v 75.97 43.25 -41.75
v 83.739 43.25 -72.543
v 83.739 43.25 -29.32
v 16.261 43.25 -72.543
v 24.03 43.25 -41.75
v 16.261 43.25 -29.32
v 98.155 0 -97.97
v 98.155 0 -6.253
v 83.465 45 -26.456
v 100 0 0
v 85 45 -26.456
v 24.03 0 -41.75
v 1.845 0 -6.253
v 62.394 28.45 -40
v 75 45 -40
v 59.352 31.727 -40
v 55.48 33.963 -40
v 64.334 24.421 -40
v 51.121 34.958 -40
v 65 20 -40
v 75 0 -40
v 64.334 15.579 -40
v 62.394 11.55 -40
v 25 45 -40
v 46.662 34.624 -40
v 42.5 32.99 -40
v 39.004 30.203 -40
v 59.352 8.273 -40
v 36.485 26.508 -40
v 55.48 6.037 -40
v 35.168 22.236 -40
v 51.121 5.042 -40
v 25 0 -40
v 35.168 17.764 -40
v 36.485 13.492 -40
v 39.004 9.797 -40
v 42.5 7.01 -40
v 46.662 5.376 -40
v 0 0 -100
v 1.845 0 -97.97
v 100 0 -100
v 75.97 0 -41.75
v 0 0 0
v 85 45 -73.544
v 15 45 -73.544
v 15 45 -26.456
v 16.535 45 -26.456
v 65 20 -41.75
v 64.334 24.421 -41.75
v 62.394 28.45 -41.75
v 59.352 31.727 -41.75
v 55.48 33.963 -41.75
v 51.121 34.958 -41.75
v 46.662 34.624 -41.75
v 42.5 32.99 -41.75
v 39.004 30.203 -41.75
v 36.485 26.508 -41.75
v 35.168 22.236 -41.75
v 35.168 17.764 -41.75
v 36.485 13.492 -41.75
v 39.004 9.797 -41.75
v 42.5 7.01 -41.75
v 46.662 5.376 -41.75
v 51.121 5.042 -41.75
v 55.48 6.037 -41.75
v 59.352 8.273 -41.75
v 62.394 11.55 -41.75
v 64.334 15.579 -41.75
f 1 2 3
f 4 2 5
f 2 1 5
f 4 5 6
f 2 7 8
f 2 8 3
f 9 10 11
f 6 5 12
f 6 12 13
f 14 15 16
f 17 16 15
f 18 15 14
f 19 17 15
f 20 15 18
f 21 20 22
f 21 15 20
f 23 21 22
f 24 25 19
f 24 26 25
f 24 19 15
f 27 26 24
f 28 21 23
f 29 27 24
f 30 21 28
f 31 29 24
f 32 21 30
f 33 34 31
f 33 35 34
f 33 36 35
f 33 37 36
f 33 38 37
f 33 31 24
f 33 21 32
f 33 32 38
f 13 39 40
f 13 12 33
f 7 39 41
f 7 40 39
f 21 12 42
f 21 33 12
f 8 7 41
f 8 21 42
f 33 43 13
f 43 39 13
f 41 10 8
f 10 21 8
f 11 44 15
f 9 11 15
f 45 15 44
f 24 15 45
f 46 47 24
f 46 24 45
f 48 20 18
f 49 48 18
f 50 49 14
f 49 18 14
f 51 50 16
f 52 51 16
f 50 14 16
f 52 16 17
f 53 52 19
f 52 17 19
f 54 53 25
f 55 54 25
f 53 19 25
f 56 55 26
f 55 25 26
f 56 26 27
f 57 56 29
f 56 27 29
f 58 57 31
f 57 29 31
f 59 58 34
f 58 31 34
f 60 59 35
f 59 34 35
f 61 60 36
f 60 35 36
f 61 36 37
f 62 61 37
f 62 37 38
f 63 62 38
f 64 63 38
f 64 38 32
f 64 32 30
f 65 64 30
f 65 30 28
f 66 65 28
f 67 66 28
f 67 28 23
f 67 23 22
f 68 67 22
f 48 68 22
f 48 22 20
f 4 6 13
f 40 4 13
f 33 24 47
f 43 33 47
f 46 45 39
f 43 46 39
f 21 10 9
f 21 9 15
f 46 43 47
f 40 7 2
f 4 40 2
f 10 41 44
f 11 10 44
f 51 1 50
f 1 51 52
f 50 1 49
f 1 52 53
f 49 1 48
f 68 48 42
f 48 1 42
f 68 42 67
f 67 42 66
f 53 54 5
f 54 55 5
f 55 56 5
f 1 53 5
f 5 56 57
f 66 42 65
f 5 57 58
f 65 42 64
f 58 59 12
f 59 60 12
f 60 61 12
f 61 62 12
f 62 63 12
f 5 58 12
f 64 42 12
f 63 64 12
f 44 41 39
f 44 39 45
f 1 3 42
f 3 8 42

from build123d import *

# Parameters (mm, degrees)
GRUNDK_RPER_DEPTH               = 100
SCHRAEGEN_VORNE_DEPTH           = 100
SCHNITT_LINEAR_AUSTRAGEN4_DEPTH = 45
WANDUNG3_T                      = -1.75
SKIZZE6_R                       = 15
SCHNITT_LINEAR_AUSTRAGEN6_DEPTH = 2


with BuildPart() as part:
    # Skizze1 → Grundkörper (new body)
    with BuildSketch(Plane.XY):
        Polygon((0, 0), (100, 0), (85, 45), (15, 45), align=None)
    extrude(amount=-GRUNDK_RPER_DEPTH)

    # Skizze2 → Schraegen_vorne (cut)
    with BuildSketch(Plane(origin=(0, 0, 0), x_dir=(0, 0, -1), z_dir=(1, 0, 0))):
        Polygon((100, 0), (73.544212344, 45), (100, 45), align=None)
    schraegen_vorne = extrude(amount=SCHRAEGEN_VORNE_DEPTH, mode=Mode.SUBTRACT)

    # Spiegel_Schraege_hinten: Schraegen_vorne across plane
    add(schraegen_vorne.mirror(Plane.XY.offset(-50)), mode=Mode.SUBTRACT)

    # Skizze4 → Schnitt-Linear austragen4 (cut)
    with BuildSketch(Plane.XZ):
        Polygon((100, 0), (75, -40), (25, -40), (0, 0), align=None)
    extrude(amount=-SCHNITT_LINEAR_AUSTRAGEN4_DEPTH, mode=Mode.SUBTRACT)

    # Wandung3
    wandung3_openings = [part.faces().sort_by_distance(p)[0] for p in [
        (50, 0, -63.80952381),
    ]]
    offset(amount=WANDUNG3_T, openings=wandung3_openings, kind=Kind.INTERSECTION)

    # Skizze6 → Schnitt-Linear austragen6 (cut)
    with BuildSketch(Plane.XY.offset(-40)):
        with Locations((50, 20)):
            Circle(SKIZZE6_R)
    extrude(amount=-SCHNITT_LINEAR_AUSTRAGEN6_DEPTH, mode=Mode.SUBTRACT)


solid = part.part
